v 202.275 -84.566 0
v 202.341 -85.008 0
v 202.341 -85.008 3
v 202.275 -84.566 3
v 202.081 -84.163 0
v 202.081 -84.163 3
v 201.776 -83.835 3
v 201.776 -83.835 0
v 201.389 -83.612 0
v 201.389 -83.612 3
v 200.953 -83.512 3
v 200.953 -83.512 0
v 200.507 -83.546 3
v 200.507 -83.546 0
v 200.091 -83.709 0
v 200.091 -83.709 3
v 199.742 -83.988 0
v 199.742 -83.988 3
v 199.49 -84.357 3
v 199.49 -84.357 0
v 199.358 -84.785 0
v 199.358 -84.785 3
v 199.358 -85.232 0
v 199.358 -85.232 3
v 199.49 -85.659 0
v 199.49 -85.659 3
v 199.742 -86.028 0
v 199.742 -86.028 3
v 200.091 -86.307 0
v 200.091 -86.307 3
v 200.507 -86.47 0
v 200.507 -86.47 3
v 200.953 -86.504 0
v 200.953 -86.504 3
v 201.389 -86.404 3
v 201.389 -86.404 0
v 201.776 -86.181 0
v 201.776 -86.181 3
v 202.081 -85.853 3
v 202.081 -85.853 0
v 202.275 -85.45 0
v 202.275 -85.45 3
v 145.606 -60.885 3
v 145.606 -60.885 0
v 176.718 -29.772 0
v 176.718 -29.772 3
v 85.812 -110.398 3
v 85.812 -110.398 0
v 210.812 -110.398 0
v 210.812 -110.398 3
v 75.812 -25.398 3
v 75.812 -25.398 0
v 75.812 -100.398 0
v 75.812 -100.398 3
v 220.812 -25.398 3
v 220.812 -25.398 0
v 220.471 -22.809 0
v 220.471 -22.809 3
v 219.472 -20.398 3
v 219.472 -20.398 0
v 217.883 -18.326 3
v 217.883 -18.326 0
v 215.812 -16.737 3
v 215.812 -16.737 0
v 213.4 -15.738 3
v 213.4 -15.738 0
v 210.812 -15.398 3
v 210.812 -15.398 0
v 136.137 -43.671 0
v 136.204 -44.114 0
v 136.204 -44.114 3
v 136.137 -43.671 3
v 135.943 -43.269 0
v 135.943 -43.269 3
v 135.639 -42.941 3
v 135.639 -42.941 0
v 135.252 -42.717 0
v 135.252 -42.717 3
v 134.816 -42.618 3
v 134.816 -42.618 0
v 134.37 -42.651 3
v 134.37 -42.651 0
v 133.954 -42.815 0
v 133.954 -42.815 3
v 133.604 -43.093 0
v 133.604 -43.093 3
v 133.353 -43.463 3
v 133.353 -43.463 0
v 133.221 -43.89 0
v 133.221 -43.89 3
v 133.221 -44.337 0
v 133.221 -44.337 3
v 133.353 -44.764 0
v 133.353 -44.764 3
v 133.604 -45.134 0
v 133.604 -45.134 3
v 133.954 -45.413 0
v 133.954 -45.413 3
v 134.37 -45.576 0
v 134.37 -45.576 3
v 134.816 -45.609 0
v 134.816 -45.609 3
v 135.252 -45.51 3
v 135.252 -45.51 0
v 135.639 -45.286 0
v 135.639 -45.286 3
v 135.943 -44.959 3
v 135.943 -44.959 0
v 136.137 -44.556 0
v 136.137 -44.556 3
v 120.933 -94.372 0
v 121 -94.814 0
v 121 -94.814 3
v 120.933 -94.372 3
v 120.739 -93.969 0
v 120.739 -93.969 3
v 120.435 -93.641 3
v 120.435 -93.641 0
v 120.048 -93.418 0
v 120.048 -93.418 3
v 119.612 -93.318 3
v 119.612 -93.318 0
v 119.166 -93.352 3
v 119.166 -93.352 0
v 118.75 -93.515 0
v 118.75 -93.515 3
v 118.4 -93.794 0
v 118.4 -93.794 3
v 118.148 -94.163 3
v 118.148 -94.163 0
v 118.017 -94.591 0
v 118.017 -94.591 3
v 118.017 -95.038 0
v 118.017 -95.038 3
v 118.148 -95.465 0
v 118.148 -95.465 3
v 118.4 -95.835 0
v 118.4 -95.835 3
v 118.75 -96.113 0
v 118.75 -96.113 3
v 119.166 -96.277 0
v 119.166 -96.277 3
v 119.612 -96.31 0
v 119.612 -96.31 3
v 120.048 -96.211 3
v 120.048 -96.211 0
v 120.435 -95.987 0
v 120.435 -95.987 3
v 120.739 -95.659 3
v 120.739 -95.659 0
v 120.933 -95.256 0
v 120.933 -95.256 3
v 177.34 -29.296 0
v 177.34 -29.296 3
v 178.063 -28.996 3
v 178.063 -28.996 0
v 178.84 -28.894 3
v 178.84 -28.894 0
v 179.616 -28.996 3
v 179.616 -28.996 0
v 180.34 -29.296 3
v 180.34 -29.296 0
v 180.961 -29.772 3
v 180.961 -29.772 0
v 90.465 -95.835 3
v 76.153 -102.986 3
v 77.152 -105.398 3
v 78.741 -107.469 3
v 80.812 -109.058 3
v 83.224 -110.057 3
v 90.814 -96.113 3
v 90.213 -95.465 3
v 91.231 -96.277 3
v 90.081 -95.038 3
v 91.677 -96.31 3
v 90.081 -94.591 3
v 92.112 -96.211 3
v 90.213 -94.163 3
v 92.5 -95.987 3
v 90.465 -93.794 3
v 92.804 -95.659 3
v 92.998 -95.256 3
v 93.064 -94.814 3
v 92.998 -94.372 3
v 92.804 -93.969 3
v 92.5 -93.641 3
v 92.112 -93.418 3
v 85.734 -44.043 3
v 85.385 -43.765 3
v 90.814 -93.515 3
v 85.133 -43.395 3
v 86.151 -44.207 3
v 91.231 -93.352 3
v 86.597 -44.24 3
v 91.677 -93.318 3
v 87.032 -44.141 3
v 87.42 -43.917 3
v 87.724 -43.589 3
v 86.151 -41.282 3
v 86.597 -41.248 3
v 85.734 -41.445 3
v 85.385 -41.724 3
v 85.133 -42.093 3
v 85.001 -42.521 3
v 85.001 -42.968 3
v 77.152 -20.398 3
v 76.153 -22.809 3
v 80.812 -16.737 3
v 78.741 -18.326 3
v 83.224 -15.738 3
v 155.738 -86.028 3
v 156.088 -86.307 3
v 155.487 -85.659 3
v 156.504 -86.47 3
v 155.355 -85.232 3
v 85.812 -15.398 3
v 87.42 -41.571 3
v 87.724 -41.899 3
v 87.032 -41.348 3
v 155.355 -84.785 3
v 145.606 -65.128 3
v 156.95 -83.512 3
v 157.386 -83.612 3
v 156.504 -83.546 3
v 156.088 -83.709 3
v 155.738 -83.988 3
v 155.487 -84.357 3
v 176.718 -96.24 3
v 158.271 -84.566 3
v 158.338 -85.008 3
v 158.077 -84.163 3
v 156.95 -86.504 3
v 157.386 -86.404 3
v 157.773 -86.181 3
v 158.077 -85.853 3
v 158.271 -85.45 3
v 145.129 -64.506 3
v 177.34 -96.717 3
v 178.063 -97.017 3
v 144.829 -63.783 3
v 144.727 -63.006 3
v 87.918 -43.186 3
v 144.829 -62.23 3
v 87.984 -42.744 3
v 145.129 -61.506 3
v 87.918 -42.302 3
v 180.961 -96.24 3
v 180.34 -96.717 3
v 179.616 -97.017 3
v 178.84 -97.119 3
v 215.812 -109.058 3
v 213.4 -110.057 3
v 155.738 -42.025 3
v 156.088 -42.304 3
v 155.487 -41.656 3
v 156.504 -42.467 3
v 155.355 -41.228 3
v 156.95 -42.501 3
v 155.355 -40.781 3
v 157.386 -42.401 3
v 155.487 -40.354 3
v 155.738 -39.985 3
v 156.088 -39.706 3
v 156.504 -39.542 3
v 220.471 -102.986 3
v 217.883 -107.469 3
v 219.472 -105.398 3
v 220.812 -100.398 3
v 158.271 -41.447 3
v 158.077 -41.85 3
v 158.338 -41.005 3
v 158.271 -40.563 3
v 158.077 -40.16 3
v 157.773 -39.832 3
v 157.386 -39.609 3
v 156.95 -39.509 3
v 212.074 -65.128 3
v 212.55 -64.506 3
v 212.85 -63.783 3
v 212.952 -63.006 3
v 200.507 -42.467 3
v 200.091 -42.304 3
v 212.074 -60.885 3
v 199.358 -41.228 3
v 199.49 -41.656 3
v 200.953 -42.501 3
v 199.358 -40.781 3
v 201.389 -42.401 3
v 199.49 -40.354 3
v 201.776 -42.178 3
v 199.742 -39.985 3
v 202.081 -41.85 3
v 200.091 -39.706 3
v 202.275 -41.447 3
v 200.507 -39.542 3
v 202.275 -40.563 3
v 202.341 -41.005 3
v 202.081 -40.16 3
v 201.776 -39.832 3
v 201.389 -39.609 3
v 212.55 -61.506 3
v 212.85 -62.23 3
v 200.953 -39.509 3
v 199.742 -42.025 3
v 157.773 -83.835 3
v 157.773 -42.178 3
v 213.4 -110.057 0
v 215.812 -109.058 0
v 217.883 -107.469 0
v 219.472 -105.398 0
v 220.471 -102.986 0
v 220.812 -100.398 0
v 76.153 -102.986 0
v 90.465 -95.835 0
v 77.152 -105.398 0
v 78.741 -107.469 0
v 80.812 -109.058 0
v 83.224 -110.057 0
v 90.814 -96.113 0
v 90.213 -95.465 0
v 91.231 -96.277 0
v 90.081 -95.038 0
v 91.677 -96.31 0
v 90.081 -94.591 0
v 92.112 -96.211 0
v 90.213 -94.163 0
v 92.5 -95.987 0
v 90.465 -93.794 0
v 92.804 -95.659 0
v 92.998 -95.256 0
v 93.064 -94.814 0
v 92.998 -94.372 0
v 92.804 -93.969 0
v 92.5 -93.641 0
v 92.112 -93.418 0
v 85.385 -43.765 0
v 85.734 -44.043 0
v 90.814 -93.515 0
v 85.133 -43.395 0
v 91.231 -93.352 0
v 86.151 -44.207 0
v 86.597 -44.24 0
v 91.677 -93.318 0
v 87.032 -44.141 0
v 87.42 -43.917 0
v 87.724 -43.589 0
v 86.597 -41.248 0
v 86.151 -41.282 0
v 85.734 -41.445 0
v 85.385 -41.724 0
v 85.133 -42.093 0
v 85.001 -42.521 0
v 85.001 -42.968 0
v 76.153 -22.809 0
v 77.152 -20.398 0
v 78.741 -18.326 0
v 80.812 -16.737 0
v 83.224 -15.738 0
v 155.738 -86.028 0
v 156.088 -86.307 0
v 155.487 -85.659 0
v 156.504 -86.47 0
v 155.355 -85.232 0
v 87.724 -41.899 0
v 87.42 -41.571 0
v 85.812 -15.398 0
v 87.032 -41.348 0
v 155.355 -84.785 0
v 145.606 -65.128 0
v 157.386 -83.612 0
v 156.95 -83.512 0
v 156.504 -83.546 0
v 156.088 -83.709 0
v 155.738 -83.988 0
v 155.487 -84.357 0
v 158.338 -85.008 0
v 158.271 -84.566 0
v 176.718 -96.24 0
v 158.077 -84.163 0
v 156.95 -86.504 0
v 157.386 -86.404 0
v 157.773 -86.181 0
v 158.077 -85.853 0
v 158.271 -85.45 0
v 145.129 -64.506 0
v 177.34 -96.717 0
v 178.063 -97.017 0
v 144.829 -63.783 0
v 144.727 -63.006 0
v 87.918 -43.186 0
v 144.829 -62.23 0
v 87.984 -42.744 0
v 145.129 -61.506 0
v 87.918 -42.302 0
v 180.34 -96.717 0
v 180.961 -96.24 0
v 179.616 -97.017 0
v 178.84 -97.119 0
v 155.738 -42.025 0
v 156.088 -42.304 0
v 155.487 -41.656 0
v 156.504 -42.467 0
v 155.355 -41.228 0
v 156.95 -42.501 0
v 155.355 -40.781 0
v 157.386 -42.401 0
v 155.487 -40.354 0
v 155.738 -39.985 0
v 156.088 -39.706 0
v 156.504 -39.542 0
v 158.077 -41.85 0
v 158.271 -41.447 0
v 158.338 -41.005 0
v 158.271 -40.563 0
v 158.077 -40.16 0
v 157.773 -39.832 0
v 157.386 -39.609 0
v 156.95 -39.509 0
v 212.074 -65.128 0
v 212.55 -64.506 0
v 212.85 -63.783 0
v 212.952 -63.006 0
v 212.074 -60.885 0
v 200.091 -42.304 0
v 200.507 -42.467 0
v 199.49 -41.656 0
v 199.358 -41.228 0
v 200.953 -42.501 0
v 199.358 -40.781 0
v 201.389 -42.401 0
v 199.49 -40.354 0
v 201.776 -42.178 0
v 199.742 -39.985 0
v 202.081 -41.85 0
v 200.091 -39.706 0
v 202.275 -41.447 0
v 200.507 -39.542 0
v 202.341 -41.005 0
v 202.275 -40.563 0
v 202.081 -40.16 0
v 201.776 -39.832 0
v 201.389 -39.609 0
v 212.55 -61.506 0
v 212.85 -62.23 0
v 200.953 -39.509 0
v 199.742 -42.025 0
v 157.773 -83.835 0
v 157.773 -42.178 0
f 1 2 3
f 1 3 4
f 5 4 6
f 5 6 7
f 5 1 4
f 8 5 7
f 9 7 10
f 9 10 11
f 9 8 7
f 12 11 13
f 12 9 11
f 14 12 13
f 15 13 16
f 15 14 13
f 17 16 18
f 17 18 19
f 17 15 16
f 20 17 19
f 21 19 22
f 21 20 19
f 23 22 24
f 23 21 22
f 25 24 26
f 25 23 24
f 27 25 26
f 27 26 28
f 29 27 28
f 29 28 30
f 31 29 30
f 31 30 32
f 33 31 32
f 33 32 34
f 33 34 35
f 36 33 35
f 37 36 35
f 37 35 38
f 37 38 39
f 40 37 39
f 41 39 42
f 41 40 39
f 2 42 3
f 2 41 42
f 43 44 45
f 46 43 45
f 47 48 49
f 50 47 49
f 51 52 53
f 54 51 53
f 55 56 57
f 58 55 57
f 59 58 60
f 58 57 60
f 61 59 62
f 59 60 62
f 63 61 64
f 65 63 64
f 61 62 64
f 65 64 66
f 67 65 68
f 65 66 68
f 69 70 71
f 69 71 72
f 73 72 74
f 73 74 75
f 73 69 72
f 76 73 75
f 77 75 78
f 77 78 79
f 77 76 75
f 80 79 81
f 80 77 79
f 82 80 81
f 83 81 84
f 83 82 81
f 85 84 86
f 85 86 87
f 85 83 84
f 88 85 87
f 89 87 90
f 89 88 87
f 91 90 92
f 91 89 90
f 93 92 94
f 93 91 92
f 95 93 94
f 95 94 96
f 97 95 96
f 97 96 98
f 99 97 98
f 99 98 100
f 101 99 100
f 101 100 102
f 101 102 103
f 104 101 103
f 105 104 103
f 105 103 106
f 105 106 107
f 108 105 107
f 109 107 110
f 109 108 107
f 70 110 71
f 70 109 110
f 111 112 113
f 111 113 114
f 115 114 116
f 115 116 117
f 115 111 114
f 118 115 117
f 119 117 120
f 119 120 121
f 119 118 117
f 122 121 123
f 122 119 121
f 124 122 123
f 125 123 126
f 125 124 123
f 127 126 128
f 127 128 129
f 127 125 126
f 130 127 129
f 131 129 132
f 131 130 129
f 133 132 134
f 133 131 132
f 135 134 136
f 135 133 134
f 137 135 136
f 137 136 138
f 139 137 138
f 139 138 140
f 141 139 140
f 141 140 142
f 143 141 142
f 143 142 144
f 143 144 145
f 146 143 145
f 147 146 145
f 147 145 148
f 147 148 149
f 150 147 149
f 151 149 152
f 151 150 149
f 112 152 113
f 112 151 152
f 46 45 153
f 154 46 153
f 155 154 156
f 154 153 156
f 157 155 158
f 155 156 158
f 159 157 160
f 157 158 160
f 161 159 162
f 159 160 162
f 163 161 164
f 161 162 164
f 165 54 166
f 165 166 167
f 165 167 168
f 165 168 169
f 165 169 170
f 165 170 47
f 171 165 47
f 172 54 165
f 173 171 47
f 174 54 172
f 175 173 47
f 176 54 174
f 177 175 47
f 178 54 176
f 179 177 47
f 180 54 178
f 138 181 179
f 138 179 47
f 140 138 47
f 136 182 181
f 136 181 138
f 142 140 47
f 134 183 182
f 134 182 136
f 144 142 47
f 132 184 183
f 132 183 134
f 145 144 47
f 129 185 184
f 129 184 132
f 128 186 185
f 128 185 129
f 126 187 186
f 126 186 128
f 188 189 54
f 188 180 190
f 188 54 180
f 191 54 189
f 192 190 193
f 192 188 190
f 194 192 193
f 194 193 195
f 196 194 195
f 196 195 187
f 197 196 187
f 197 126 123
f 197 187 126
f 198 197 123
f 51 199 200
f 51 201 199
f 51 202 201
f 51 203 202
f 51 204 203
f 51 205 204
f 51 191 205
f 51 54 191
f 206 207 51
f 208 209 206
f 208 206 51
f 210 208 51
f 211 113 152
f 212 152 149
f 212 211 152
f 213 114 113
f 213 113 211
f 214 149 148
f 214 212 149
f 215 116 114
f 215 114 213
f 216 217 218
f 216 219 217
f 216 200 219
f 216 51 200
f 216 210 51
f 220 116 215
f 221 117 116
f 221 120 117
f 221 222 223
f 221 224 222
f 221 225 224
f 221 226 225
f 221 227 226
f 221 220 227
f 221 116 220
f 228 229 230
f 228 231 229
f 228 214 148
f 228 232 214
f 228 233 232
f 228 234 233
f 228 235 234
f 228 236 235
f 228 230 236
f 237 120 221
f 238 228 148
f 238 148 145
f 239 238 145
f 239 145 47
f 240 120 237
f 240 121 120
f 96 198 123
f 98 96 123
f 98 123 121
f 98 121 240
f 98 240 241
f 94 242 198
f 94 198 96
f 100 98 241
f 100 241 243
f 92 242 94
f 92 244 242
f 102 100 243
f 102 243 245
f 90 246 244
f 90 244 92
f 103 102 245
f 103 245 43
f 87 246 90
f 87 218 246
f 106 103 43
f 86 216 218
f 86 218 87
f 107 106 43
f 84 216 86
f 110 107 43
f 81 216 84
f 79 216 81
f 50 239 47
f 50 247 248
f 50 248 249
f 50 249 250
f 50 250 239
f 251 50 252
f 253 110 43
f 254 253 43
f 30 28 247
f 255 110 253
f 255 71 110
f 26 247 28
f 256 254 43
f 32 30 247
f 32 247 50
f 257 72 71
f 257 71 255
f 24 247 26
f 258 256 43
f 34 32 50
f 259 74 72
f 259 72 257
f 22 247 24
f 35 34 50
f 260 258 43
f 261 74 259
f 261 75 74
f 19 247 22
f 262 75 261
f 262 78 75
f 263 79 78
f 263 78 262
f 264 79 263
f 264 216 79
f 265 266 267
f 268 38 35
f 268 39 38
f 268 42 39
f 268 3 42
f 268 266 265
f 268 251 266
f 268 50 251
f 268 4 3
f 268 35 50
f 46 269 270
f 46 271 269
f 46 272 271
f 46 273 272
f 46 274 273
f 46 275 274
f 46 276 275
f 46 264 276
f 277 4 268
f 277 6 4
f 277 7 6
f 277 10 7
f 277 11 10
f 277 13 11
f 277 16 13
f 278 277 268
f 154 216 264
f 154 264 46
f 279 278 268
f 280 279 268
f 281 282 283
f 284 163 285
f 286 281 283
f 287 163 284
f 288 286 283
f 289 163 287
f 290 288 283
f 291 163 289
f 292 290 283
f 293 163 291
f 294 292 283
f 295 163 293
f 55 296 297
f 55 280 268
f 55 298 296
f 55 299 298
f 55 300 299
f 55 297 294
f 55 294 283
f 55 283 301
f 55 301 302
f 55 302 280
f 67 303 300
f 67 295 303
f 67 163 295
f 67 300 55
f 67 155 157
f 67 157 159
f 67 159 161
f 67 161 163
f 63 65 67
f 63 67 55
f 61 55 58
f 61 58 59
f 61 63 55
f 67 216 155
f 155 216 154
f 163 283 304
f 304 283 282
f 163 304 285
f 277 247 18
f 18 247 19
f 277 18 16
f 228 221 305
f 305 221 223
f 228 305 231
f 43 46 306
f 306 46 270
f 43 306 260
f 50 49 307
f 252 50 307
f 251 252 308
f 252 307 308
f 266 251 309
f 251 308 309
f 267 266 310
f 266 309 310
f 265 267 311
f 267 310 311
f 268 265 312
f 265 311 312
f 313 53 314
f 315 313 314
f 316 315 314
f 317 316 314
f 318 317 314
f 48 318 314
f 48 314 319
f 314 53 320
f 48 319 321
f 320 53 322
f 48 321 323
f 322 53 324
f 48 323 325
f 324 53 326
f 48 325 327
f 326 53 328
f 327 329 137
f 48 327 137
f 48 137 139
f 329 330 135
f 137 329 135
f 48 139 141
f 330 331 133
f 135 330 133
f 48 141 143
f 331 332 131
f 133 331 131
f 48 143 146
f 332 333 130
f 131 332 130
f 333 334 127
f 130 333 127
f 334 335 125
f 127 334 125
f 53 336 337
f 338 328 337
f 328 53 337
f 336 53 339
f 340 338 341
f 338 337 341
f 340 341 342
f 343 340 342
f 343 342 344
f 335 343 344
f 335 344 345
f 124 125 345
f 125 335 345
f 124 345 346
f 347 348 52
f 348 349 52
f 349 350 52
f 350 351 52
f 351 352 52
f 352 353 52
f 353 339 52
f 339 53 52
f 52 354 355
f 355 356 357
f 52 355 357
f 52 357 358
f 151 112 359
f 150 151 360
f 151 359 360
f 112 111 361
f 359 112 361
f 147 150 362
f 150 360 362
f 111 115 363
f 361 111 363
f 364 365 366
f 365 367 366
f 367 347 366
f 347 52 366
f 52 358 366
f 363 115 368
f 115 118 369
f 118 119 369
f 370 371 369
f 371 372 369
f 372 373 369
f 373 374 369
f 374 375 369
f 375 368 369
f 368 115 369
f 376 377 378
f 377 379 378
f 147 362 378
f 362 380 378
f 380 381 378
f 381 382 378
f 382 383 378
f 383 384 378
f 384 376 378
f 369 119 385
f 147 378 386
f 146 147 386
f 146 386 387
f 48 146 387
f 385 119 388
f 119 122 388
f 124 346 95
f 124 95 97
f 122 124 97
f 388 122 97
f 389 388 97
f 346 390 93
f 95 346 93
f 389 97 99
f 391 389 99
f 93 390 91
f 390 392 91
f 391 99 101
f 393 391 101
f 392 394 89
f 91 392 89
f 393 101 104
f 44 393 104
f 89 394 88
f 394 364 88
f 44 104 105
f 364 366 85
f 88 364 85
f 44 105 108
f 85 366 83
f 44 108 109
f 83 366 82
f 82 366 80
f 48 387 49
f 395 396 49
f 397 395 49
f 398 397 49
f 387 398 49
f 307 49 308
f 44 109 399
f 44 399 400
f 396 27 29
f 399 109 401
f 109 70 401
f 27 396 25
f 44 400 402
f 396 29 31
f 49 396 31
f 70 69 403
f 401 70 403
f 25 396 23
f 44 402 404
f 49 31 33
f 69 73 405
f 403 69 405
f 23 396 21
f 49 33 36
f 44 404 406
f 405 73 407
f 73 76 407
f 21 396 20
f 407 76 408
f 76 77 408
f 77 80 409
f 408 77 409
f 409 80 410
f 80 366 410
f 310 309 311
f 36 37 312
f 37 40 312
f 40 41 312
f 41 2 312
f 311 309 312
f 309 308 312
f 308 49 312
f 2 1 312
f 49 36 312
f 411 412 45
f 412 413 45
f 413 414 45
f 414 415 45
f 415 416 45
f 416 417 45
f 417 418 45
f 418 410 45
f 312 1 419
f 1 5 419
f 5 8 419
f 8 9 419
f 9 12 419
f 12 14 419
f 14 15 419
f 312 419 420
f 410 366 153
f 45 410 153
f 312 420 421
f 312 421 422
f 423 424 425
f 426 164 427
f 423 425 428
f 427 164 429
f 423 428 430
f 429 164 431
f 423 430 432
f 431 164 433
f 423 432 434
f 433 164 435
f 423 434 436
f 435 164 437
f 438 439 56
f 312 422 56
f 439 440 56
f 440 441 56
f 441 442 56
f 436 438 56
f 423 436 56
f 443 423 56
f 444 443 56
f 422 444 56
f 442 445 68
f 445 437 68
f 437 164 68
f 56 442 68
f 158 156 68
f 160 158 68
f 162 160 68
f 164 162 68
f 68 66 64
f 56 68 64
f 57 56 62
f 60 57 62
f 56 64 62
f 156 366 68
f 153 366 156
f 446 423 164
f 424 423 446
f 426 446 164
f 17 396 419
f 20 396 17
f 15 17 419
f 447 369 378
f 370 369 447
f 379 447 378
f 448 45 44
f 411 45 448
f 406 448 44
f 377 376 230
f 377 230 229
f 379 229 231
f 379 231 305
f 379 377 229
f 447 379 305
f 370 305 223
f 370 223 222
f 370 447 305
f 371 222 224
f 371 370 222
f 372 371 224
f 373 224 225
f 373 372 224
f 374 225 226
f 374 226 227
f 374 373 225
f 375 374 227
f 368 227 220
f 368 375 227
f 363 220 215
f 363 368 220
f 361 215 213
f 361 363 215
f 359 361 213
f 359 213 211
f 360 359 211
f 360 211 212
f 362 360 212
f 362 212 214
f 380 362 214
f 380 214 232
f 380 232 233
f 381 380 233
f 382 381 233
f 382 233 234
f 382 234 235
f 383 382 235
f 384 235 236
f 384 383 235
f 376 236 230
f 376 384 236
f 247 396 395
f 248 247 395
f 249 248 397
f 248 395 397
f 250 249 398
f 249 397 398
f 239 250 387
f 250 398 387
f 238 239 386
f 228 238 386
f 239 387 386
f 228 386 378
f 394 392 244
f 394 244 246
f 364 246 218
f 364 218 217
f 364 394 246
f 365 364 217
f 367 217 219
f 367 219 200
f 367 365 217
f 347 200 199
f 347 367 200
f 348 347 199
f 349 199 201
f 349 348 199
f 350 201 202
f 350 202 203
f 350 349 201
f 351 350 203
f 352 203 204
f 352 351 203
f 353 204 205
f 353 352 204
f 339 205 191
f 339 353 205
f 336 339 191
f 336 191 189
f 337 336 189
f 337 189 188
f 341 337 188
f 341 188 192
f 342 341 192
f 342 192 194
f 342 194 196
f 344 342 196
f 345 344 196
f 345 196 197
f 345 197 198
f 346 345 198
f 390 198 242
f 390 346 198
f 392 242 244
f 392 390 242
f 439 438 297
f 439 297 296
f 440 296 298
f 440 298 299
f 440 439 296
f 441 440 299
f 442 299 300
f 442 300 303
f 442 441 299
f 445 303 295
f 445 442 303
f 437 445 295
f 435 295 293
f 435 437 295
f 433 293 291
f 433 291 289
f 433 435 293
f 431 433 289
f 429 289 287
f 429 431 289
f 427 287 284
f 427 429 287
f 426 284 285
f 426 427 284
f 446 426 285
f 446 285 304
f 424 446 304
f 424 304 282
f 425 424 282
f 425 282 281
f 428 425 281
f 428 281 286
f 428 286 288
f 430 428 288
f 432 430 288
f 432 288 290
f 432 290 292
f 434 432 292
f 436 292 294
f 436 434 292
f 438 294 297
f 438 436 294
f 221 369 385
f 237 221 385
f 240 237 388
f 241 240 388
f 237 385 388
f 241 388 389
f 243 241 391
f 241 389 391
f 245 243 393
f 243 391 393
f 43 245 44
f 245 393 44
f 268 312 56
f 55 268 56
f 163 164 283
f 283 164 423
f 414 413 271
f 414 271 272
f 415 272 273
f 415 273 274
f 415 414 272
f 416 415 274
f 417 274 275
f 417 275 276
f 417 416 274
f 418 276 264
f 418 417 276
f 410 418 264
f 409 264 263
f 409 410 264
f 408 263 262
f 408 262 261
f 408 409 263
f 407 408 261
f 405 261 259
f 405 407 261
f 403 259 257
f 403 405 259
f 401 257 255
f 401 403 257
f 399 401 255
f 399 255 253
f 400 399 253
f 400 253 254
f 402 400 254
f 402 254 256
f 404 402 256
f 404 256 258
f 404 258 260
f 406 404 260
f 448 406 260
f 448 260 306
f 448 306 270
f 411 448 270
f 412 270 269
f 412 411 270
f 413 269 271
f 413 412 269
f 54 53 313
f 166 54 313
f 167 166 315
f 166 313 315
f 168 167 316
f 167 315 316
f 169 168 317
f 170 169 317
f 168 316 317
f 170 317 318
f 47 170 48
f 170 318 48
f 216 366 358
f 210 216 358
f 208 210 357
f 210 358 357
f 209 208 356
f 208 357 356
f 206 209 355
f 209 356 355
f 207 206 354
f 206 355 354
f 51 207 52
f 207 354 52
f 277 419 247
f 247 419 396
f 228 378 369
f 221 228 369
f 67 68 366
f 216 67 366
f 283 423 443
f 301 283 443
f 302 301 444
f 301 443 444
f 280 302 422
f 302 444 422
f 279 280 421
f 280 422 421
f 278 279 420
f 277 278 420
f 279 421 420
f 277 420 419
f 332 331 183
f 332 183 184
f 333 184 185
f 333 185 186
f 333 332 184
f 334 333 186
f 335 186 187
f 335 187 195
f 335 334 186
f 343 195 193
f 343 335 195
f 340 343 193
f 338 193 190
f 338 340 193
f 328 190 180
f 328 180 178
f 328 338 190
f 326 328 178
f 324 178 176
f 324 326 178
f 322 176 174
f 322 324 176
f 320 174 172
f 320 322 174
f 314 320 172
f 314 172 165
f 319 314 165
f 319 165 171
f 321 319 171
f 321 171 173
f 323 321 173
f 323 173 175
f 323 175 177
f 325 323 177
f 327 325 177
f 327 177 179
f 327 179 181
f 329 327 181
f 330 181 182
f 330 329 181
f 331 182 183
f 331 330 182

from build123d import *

# Parameters (mm, degrees)
ESQUISSE15_R        = 1.5
BOSS_EXTRU_15_DEPTH = 3


with BuildPart() as part:
    # Esquisse15 → Boss.-Extru.15 (new body)
    with BuildSketch(Plane.XY):
        with BuildLine():
            Line((210.81212736, -15.397544228), (85.81212736, -15.397544228))
            ThreePointArc((85.81212736, -15.397544228), (78.741059548, -18.326476416), (75.81212736, -25.397544228))
            Line((75.81212736, -25.397544228), (75.81212736, -100.397544228))
            ThreePointArc((75.81212736, -100.397544228), (78.741059548, -107.468612039), (85.81212736, -110.397544228))
            Line((85.81212736, -110.397544228), (210.81212736, -110.397544228))
            ThreePointArc((210.81212736, -110.397544228), (217.883195172, -107.468612039), (220.81212736, -100.397544228))
            Line((220.81212736, -100.397544228), (220.81212736, -25.397544228))
            ThreePointArc((220.81212736, -25.397544228), (217.883195172, -18.326476416), (210.81212736, -15.397544228))
        make_face()
        with Locations((156.837999603, -85.008074041)):
            Circle(ESQUISSE15_R, mode=Mode.SUBTRACT)
        with Locations((156.837999603, -41.004819048)):
            Circle(ESQUISSE15_R, mode=Mode.SUBTRACT)
        with Locations((200.841254596, -41.004819048)):
            Circle(ESQUISSE15_R, mode=Mode.SUBTRACT)
        with Locations((200.841254596, -85.008074041)):
            Circle(ESQUISSE15_R, mode=Mode.SUBTRACT)
        with Locations((86.484439521, -42.744244907)):
            Circle(ESQUISSE15_R, mode=Mode.SUBTRACT)
        with Locations((134.704025572, -44.113620634)):
            Circle(ESQUISSE15_R, mode=Mode.SUBTRACT)
        with Locations((119.499920391, -94.814244907)):
            Circle(ESQUISSE15_R, mode=Mode.SUBTRACT)
        with Locations((91.564439521, -94.814244907)):
            Circle(ESQUISSE15_R, mode=Mode.SUBTRACT)
        with BuildLine():
            Line((180.960947443, -29.772427829), (212.073645815, -60.885126201))
            ThreePointArc((212.073645815, -60.885126201), (212.952325471, -63.006446545), (212.073645815, -65.127766888))
            Line((212.073645815, -65.127766888), (180.960947443, -96.24046526))
            ThreePointArc((180.960947443, -96.24046526), (178.839627099, -97.119144917), (176.718306756, -96.24046526))
            Line((176.718306756, -96.24046526), (145.605608383, -65.127766888))
            ThreePointArc((145.605608383, -65.127766888), (144.726928727, -63.006446545), (145.605608383, -60.885126201))
            Line((145.605608383, -60.885126201), (176.718306756, -29.772427829))
            ThreePointArc((176.718306756, -29.772427829), (178.839627099, -28.893748172), (180.960947443, -29.772427829))
        make_face(mode=Mode.SUBTRACT)
    extrude(amount=BOSS_EXTRU_15_DEPTH)


solid = part.part
